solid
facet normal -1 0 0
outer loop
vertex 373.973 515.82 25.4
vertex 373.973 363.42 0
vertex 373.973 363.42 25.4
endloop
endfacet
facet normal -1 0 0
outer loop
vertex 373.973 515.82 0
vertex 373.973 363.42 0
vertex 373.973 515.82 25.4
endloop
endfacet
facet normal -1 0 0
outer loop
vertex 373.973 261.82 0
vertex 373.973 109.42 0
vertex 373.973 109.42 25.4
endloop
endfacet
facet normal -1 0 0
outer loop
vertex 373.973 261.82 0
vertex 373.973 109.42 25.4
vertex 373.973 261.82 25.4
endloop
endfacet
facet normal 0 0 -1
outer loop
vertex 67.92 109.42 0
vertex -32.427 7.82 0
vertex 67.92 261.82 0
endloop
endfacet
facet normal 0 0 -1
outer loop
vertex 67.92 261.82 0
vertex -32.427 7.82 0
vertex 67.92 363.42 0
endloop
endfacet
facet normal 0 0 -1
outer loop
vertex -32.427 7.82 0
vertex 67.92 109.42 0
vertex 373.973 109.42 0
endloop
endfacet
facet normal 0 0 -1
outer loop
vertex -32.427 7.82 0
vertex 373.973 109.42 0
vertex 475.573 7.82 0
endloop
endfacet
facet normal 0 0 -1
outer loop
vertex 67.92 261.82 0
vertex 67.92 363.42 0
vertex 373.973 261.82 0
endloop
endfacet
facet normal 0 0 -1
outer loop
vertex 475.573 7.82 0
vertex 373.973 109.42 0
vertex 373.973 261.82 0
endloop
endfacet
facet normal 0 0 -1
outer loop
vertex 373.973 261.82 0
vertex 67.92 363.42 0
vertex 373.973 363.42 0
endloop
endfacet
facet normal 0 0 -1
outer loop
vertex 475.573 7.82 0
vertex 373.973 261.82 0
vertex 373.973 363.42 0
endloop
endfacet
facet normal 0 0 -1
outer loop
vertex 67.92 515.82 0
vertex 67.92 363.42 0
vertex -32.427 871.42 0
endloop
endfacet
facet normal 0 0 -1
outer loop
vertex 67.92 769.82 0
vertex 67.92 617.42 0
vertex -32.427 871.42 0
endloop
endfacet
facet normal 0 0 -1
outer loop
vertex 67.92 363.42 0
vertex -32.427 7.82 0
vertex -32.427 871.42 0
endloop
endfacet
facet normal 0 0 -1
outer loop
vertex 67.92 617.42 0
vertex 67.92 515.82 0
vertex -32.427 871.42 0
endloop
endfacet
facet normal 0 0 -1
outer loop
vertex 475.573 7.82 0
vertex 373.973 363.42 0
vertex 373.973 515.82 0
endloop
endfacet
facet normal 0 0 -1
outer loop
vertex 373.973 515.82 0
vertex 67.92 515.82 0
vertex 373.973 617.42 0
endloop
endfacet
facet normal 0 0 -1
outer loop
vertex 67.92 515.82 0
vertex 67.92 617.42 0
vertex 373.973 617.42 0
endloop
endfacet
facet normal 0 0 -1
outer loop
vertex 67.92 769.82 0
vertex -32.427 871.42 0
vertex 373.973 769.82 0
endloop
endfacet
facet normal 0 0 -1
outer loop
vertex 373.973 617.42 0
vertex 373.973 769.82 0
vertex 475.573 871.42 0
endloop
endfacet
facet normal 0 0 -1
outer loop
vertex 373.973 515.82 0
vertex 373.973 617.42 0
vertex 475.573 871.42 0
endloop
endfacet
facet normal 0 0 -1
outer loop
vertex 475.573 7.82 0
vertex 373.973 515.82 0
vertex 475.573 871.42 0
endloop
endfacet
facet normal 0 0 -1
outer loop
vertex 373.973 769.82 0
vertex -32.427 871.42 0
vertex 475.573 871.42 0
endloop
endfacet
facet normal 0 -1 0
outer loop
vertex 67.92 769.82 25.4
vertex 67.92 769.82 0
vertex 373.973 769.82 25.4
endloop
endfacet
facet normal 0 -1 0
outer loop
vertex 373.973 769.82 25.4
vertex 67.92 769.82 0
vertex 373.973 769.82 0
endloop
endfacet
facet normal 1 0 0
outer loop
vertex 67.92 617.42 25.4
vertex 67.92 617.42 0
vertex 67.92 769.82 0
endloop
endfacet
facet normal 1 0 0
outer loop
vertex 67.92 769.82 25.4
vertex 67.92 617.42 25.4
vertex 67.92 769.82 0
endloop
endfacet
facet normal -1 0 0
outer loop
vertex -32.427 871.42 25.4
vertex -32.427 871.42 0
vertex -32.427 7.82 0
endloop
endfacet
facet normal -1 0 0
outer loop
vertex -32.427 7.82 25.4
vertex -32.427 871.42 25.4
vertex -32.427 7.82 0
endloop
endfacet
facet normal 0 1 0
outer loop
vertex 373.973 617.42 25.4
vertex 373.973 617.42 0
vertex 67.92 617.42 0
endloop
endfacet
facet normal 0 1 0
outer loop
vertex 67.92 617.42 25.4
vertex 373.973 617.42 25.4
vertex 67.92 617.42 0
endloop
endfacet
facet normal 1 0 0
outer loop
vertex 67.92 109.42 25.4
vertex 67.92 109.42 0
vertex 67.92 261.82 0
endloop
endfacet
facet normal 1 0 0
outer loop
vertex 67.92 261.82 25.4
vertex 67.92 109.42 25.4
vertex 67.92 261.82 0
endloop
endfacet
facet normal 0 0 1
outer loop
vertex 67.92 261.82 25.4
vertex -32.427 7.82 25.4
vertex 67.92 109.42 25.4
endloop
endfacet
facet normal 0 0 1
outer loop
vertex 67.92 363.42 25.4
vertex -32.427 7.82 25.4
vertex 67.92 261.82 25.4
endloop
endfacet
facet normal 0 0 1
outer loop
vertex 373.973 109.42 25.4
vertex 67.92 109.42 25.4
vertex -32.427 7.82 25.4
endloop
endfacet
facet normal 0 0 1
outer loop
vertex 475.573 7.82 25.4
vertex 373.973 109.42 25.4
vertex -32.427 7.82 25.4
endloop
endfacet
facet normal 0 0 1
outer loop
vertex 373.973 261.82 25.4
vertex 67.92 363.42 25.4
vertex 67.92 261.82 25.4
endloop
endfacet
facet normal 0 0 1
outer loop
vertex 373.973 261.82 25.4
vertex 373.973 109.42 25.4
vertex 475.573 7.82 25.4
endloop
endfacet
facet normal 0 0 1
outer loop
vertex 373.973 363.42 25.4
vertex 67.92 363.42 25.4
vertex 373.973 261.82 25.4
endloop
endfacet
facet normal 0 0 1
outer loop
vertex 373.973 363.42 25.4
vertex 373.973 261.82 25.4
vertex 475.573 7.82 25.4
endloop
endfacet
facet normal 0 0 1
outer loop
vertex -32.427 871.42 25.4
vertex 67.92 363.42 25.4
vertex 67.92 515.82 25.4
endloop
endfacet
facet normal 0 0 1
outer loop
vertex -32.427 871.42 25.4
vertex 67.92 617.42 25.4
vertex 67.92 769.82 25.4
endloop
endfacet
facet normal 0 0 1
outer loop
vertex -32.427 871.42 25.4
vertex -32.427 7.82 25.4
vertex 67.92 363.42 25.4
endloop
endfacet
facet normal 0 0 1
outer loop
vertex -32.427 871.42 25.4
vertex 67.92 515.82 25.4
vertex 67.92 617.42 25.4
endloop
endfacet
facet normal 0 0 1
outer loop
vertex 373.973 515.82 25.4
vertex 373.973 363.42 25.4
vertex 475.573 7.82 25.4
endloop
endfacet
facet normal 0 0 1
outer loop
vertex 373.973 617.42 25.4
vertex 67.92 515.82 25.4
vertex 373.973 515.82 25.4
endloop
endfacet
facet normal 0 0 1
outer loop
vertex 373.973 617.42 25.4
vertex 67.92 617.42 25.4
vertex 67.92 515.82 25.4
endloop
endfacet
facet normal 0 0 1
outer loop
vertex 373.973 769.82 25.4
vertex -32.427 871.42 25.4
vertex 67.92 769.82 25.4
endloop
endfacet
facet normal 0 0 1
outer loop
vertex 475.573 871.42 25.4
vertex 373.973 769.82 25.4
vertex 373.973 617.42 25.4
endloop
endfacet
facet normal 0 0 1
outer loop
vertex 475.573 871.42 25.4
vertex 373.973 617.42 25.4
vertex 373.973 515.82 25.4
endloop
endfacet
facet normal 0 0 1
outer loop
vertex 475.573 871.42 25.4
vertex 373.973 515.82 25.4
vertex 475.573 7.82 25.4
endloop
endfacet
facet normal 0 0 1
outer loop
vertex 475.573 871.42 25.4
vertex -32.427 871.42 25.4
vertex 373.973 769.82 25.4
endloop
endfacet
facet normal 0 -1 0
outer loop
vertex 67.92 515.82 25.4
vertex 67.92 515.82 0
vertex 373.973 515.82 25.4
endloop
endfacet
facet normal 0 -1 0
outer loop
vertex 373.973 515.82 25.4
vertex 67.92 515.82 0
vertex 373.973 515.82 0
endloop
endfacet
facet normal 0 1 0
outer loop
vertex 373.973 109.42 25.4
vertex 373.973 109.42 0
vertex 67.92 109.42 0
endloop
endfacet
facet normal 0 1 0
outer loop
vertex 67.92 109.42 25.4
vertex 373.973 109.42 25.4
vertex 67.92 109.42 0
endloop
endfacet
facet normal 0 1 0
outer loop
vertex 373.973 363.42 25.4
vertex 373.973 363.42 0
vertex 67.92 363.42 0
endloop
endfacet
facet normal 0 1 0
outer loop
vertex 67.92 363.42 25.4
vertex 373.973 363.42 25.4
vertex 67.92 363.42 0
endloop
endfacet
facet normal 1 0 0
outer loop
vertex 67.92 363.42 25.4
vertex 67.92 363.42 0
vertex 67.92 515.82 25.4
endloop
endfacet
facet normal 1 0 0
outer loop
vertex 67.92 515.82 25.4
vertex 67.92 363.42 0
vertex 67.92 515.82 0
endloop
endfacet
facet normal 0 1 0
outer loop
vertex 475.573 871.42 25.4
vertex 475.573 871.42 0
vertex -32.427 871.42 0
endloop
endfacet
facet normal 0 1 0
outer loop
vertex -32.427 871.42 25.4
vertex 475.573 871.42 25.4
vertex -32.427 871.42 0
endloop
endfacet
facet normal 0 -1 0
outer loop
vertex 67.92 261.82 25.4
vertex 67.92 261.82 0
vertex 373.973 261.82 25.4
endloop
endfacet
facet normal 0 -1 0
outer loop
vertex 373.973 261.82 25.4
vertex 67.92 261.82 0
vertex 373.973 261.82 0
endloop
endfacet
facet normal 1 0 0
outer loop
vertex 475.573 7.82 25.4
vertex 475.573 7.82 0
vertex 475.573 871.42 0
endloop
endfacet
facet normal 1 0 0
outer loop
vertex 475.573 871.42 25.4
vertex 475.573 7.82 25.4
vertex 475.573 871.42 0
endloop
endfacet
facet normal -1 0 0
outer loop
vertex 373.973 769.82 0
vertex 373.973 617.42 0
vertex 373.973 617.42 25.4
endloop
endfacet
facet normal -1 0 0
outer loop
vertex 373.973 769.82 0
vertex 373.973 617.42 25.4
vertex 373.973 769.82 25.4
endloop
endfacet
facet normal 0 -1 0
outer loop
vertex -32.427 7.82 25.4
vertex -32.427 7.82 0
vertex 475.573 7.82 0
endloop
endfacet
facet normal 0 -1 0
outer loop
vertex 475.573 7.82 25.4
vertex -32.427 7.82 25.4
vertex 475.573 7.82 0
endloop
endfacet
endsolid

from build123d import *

# Parameters (mm, degrees)
F0_W     = 306.0534086764
F0_H     = 101.6
F0_W_2   = 101.6
F0_H_2   = 152.4
F0_W_3   = 100.3465913236
F1_DEPTH = 25.4


with BuildPart() as f1:
    # F0 (on Top) → F1 (new body)
    with BuildSketch(Plane.XY):
        with Locations((220.9462343127, 820.6196134418)):
            Rectangle(F0_W, F0_H)
        with Locations((220.9462343127, 566.6196134418)):
            Rectangle(F0_W, F0_H)
        with Locations((220.9462343127, 312.6196134418)):
            Rectangle(F0_W, F0_H)
        with Locations((220.9462343127, 58.6196134418)):
            Rectangle(F0_W, F0_H)
        with Locations((424.7729386508, 58.6196134418)):
            Rectangle(F0_W_2, F0_H)
        with Locations((424.7729386508, 185.6196134418)):
            Rectangle(F0_W_2, F0_H_2)
        with Locations((424.7729386508, 312.6196134418)):
            Rectangle(F0_W_2, F0_H)
        with Locations((424.7729386508, 439.6196134418)):
            Rectangle(F0_W_2, F0_H_2)
        with Locations((424.7729386508, 566.6196134418)):
            Rectangle(F0_W_2, F0_H)
        with Locations((424.7729386508, 693.6196134418)):
            Rectangle(F0_W_2, F0_H_2)
        with Locations((424.7729386508, 820.6196134418)):
            Rectangle(F0_W_2, F0_H)
        with Locations((17.7462343127, 820.6196134418)):
            Rectangle(F0_W_3, F0_H)
        with Locations((17.7462343127, 693.6196134418)):
            Rectangle(F0_W_3, F0_H_2)
        with Locations((17.7462343127, 566.6196134418)):
            Rectangle(F0_W_3, F0_H)
        with Locations((17.7462343127, 439.6196134418)):
            Rectangle(F0_W_3, F0_H_2)
        with Locations((17.7462343127, 312.6196134418)):
            Rectangle(F0_W_3, F0_H)
        with Locations((17.7462343127, 185.6196134418)):
            Rectangle(F0_W_3, F0_H_2)
        with Locations((17.7462343127, 58.6196134418)):
            Rectangle(F0_W_3, F0_H)
    extrude(amount=F1_DEPTH)


solid = f1.part
